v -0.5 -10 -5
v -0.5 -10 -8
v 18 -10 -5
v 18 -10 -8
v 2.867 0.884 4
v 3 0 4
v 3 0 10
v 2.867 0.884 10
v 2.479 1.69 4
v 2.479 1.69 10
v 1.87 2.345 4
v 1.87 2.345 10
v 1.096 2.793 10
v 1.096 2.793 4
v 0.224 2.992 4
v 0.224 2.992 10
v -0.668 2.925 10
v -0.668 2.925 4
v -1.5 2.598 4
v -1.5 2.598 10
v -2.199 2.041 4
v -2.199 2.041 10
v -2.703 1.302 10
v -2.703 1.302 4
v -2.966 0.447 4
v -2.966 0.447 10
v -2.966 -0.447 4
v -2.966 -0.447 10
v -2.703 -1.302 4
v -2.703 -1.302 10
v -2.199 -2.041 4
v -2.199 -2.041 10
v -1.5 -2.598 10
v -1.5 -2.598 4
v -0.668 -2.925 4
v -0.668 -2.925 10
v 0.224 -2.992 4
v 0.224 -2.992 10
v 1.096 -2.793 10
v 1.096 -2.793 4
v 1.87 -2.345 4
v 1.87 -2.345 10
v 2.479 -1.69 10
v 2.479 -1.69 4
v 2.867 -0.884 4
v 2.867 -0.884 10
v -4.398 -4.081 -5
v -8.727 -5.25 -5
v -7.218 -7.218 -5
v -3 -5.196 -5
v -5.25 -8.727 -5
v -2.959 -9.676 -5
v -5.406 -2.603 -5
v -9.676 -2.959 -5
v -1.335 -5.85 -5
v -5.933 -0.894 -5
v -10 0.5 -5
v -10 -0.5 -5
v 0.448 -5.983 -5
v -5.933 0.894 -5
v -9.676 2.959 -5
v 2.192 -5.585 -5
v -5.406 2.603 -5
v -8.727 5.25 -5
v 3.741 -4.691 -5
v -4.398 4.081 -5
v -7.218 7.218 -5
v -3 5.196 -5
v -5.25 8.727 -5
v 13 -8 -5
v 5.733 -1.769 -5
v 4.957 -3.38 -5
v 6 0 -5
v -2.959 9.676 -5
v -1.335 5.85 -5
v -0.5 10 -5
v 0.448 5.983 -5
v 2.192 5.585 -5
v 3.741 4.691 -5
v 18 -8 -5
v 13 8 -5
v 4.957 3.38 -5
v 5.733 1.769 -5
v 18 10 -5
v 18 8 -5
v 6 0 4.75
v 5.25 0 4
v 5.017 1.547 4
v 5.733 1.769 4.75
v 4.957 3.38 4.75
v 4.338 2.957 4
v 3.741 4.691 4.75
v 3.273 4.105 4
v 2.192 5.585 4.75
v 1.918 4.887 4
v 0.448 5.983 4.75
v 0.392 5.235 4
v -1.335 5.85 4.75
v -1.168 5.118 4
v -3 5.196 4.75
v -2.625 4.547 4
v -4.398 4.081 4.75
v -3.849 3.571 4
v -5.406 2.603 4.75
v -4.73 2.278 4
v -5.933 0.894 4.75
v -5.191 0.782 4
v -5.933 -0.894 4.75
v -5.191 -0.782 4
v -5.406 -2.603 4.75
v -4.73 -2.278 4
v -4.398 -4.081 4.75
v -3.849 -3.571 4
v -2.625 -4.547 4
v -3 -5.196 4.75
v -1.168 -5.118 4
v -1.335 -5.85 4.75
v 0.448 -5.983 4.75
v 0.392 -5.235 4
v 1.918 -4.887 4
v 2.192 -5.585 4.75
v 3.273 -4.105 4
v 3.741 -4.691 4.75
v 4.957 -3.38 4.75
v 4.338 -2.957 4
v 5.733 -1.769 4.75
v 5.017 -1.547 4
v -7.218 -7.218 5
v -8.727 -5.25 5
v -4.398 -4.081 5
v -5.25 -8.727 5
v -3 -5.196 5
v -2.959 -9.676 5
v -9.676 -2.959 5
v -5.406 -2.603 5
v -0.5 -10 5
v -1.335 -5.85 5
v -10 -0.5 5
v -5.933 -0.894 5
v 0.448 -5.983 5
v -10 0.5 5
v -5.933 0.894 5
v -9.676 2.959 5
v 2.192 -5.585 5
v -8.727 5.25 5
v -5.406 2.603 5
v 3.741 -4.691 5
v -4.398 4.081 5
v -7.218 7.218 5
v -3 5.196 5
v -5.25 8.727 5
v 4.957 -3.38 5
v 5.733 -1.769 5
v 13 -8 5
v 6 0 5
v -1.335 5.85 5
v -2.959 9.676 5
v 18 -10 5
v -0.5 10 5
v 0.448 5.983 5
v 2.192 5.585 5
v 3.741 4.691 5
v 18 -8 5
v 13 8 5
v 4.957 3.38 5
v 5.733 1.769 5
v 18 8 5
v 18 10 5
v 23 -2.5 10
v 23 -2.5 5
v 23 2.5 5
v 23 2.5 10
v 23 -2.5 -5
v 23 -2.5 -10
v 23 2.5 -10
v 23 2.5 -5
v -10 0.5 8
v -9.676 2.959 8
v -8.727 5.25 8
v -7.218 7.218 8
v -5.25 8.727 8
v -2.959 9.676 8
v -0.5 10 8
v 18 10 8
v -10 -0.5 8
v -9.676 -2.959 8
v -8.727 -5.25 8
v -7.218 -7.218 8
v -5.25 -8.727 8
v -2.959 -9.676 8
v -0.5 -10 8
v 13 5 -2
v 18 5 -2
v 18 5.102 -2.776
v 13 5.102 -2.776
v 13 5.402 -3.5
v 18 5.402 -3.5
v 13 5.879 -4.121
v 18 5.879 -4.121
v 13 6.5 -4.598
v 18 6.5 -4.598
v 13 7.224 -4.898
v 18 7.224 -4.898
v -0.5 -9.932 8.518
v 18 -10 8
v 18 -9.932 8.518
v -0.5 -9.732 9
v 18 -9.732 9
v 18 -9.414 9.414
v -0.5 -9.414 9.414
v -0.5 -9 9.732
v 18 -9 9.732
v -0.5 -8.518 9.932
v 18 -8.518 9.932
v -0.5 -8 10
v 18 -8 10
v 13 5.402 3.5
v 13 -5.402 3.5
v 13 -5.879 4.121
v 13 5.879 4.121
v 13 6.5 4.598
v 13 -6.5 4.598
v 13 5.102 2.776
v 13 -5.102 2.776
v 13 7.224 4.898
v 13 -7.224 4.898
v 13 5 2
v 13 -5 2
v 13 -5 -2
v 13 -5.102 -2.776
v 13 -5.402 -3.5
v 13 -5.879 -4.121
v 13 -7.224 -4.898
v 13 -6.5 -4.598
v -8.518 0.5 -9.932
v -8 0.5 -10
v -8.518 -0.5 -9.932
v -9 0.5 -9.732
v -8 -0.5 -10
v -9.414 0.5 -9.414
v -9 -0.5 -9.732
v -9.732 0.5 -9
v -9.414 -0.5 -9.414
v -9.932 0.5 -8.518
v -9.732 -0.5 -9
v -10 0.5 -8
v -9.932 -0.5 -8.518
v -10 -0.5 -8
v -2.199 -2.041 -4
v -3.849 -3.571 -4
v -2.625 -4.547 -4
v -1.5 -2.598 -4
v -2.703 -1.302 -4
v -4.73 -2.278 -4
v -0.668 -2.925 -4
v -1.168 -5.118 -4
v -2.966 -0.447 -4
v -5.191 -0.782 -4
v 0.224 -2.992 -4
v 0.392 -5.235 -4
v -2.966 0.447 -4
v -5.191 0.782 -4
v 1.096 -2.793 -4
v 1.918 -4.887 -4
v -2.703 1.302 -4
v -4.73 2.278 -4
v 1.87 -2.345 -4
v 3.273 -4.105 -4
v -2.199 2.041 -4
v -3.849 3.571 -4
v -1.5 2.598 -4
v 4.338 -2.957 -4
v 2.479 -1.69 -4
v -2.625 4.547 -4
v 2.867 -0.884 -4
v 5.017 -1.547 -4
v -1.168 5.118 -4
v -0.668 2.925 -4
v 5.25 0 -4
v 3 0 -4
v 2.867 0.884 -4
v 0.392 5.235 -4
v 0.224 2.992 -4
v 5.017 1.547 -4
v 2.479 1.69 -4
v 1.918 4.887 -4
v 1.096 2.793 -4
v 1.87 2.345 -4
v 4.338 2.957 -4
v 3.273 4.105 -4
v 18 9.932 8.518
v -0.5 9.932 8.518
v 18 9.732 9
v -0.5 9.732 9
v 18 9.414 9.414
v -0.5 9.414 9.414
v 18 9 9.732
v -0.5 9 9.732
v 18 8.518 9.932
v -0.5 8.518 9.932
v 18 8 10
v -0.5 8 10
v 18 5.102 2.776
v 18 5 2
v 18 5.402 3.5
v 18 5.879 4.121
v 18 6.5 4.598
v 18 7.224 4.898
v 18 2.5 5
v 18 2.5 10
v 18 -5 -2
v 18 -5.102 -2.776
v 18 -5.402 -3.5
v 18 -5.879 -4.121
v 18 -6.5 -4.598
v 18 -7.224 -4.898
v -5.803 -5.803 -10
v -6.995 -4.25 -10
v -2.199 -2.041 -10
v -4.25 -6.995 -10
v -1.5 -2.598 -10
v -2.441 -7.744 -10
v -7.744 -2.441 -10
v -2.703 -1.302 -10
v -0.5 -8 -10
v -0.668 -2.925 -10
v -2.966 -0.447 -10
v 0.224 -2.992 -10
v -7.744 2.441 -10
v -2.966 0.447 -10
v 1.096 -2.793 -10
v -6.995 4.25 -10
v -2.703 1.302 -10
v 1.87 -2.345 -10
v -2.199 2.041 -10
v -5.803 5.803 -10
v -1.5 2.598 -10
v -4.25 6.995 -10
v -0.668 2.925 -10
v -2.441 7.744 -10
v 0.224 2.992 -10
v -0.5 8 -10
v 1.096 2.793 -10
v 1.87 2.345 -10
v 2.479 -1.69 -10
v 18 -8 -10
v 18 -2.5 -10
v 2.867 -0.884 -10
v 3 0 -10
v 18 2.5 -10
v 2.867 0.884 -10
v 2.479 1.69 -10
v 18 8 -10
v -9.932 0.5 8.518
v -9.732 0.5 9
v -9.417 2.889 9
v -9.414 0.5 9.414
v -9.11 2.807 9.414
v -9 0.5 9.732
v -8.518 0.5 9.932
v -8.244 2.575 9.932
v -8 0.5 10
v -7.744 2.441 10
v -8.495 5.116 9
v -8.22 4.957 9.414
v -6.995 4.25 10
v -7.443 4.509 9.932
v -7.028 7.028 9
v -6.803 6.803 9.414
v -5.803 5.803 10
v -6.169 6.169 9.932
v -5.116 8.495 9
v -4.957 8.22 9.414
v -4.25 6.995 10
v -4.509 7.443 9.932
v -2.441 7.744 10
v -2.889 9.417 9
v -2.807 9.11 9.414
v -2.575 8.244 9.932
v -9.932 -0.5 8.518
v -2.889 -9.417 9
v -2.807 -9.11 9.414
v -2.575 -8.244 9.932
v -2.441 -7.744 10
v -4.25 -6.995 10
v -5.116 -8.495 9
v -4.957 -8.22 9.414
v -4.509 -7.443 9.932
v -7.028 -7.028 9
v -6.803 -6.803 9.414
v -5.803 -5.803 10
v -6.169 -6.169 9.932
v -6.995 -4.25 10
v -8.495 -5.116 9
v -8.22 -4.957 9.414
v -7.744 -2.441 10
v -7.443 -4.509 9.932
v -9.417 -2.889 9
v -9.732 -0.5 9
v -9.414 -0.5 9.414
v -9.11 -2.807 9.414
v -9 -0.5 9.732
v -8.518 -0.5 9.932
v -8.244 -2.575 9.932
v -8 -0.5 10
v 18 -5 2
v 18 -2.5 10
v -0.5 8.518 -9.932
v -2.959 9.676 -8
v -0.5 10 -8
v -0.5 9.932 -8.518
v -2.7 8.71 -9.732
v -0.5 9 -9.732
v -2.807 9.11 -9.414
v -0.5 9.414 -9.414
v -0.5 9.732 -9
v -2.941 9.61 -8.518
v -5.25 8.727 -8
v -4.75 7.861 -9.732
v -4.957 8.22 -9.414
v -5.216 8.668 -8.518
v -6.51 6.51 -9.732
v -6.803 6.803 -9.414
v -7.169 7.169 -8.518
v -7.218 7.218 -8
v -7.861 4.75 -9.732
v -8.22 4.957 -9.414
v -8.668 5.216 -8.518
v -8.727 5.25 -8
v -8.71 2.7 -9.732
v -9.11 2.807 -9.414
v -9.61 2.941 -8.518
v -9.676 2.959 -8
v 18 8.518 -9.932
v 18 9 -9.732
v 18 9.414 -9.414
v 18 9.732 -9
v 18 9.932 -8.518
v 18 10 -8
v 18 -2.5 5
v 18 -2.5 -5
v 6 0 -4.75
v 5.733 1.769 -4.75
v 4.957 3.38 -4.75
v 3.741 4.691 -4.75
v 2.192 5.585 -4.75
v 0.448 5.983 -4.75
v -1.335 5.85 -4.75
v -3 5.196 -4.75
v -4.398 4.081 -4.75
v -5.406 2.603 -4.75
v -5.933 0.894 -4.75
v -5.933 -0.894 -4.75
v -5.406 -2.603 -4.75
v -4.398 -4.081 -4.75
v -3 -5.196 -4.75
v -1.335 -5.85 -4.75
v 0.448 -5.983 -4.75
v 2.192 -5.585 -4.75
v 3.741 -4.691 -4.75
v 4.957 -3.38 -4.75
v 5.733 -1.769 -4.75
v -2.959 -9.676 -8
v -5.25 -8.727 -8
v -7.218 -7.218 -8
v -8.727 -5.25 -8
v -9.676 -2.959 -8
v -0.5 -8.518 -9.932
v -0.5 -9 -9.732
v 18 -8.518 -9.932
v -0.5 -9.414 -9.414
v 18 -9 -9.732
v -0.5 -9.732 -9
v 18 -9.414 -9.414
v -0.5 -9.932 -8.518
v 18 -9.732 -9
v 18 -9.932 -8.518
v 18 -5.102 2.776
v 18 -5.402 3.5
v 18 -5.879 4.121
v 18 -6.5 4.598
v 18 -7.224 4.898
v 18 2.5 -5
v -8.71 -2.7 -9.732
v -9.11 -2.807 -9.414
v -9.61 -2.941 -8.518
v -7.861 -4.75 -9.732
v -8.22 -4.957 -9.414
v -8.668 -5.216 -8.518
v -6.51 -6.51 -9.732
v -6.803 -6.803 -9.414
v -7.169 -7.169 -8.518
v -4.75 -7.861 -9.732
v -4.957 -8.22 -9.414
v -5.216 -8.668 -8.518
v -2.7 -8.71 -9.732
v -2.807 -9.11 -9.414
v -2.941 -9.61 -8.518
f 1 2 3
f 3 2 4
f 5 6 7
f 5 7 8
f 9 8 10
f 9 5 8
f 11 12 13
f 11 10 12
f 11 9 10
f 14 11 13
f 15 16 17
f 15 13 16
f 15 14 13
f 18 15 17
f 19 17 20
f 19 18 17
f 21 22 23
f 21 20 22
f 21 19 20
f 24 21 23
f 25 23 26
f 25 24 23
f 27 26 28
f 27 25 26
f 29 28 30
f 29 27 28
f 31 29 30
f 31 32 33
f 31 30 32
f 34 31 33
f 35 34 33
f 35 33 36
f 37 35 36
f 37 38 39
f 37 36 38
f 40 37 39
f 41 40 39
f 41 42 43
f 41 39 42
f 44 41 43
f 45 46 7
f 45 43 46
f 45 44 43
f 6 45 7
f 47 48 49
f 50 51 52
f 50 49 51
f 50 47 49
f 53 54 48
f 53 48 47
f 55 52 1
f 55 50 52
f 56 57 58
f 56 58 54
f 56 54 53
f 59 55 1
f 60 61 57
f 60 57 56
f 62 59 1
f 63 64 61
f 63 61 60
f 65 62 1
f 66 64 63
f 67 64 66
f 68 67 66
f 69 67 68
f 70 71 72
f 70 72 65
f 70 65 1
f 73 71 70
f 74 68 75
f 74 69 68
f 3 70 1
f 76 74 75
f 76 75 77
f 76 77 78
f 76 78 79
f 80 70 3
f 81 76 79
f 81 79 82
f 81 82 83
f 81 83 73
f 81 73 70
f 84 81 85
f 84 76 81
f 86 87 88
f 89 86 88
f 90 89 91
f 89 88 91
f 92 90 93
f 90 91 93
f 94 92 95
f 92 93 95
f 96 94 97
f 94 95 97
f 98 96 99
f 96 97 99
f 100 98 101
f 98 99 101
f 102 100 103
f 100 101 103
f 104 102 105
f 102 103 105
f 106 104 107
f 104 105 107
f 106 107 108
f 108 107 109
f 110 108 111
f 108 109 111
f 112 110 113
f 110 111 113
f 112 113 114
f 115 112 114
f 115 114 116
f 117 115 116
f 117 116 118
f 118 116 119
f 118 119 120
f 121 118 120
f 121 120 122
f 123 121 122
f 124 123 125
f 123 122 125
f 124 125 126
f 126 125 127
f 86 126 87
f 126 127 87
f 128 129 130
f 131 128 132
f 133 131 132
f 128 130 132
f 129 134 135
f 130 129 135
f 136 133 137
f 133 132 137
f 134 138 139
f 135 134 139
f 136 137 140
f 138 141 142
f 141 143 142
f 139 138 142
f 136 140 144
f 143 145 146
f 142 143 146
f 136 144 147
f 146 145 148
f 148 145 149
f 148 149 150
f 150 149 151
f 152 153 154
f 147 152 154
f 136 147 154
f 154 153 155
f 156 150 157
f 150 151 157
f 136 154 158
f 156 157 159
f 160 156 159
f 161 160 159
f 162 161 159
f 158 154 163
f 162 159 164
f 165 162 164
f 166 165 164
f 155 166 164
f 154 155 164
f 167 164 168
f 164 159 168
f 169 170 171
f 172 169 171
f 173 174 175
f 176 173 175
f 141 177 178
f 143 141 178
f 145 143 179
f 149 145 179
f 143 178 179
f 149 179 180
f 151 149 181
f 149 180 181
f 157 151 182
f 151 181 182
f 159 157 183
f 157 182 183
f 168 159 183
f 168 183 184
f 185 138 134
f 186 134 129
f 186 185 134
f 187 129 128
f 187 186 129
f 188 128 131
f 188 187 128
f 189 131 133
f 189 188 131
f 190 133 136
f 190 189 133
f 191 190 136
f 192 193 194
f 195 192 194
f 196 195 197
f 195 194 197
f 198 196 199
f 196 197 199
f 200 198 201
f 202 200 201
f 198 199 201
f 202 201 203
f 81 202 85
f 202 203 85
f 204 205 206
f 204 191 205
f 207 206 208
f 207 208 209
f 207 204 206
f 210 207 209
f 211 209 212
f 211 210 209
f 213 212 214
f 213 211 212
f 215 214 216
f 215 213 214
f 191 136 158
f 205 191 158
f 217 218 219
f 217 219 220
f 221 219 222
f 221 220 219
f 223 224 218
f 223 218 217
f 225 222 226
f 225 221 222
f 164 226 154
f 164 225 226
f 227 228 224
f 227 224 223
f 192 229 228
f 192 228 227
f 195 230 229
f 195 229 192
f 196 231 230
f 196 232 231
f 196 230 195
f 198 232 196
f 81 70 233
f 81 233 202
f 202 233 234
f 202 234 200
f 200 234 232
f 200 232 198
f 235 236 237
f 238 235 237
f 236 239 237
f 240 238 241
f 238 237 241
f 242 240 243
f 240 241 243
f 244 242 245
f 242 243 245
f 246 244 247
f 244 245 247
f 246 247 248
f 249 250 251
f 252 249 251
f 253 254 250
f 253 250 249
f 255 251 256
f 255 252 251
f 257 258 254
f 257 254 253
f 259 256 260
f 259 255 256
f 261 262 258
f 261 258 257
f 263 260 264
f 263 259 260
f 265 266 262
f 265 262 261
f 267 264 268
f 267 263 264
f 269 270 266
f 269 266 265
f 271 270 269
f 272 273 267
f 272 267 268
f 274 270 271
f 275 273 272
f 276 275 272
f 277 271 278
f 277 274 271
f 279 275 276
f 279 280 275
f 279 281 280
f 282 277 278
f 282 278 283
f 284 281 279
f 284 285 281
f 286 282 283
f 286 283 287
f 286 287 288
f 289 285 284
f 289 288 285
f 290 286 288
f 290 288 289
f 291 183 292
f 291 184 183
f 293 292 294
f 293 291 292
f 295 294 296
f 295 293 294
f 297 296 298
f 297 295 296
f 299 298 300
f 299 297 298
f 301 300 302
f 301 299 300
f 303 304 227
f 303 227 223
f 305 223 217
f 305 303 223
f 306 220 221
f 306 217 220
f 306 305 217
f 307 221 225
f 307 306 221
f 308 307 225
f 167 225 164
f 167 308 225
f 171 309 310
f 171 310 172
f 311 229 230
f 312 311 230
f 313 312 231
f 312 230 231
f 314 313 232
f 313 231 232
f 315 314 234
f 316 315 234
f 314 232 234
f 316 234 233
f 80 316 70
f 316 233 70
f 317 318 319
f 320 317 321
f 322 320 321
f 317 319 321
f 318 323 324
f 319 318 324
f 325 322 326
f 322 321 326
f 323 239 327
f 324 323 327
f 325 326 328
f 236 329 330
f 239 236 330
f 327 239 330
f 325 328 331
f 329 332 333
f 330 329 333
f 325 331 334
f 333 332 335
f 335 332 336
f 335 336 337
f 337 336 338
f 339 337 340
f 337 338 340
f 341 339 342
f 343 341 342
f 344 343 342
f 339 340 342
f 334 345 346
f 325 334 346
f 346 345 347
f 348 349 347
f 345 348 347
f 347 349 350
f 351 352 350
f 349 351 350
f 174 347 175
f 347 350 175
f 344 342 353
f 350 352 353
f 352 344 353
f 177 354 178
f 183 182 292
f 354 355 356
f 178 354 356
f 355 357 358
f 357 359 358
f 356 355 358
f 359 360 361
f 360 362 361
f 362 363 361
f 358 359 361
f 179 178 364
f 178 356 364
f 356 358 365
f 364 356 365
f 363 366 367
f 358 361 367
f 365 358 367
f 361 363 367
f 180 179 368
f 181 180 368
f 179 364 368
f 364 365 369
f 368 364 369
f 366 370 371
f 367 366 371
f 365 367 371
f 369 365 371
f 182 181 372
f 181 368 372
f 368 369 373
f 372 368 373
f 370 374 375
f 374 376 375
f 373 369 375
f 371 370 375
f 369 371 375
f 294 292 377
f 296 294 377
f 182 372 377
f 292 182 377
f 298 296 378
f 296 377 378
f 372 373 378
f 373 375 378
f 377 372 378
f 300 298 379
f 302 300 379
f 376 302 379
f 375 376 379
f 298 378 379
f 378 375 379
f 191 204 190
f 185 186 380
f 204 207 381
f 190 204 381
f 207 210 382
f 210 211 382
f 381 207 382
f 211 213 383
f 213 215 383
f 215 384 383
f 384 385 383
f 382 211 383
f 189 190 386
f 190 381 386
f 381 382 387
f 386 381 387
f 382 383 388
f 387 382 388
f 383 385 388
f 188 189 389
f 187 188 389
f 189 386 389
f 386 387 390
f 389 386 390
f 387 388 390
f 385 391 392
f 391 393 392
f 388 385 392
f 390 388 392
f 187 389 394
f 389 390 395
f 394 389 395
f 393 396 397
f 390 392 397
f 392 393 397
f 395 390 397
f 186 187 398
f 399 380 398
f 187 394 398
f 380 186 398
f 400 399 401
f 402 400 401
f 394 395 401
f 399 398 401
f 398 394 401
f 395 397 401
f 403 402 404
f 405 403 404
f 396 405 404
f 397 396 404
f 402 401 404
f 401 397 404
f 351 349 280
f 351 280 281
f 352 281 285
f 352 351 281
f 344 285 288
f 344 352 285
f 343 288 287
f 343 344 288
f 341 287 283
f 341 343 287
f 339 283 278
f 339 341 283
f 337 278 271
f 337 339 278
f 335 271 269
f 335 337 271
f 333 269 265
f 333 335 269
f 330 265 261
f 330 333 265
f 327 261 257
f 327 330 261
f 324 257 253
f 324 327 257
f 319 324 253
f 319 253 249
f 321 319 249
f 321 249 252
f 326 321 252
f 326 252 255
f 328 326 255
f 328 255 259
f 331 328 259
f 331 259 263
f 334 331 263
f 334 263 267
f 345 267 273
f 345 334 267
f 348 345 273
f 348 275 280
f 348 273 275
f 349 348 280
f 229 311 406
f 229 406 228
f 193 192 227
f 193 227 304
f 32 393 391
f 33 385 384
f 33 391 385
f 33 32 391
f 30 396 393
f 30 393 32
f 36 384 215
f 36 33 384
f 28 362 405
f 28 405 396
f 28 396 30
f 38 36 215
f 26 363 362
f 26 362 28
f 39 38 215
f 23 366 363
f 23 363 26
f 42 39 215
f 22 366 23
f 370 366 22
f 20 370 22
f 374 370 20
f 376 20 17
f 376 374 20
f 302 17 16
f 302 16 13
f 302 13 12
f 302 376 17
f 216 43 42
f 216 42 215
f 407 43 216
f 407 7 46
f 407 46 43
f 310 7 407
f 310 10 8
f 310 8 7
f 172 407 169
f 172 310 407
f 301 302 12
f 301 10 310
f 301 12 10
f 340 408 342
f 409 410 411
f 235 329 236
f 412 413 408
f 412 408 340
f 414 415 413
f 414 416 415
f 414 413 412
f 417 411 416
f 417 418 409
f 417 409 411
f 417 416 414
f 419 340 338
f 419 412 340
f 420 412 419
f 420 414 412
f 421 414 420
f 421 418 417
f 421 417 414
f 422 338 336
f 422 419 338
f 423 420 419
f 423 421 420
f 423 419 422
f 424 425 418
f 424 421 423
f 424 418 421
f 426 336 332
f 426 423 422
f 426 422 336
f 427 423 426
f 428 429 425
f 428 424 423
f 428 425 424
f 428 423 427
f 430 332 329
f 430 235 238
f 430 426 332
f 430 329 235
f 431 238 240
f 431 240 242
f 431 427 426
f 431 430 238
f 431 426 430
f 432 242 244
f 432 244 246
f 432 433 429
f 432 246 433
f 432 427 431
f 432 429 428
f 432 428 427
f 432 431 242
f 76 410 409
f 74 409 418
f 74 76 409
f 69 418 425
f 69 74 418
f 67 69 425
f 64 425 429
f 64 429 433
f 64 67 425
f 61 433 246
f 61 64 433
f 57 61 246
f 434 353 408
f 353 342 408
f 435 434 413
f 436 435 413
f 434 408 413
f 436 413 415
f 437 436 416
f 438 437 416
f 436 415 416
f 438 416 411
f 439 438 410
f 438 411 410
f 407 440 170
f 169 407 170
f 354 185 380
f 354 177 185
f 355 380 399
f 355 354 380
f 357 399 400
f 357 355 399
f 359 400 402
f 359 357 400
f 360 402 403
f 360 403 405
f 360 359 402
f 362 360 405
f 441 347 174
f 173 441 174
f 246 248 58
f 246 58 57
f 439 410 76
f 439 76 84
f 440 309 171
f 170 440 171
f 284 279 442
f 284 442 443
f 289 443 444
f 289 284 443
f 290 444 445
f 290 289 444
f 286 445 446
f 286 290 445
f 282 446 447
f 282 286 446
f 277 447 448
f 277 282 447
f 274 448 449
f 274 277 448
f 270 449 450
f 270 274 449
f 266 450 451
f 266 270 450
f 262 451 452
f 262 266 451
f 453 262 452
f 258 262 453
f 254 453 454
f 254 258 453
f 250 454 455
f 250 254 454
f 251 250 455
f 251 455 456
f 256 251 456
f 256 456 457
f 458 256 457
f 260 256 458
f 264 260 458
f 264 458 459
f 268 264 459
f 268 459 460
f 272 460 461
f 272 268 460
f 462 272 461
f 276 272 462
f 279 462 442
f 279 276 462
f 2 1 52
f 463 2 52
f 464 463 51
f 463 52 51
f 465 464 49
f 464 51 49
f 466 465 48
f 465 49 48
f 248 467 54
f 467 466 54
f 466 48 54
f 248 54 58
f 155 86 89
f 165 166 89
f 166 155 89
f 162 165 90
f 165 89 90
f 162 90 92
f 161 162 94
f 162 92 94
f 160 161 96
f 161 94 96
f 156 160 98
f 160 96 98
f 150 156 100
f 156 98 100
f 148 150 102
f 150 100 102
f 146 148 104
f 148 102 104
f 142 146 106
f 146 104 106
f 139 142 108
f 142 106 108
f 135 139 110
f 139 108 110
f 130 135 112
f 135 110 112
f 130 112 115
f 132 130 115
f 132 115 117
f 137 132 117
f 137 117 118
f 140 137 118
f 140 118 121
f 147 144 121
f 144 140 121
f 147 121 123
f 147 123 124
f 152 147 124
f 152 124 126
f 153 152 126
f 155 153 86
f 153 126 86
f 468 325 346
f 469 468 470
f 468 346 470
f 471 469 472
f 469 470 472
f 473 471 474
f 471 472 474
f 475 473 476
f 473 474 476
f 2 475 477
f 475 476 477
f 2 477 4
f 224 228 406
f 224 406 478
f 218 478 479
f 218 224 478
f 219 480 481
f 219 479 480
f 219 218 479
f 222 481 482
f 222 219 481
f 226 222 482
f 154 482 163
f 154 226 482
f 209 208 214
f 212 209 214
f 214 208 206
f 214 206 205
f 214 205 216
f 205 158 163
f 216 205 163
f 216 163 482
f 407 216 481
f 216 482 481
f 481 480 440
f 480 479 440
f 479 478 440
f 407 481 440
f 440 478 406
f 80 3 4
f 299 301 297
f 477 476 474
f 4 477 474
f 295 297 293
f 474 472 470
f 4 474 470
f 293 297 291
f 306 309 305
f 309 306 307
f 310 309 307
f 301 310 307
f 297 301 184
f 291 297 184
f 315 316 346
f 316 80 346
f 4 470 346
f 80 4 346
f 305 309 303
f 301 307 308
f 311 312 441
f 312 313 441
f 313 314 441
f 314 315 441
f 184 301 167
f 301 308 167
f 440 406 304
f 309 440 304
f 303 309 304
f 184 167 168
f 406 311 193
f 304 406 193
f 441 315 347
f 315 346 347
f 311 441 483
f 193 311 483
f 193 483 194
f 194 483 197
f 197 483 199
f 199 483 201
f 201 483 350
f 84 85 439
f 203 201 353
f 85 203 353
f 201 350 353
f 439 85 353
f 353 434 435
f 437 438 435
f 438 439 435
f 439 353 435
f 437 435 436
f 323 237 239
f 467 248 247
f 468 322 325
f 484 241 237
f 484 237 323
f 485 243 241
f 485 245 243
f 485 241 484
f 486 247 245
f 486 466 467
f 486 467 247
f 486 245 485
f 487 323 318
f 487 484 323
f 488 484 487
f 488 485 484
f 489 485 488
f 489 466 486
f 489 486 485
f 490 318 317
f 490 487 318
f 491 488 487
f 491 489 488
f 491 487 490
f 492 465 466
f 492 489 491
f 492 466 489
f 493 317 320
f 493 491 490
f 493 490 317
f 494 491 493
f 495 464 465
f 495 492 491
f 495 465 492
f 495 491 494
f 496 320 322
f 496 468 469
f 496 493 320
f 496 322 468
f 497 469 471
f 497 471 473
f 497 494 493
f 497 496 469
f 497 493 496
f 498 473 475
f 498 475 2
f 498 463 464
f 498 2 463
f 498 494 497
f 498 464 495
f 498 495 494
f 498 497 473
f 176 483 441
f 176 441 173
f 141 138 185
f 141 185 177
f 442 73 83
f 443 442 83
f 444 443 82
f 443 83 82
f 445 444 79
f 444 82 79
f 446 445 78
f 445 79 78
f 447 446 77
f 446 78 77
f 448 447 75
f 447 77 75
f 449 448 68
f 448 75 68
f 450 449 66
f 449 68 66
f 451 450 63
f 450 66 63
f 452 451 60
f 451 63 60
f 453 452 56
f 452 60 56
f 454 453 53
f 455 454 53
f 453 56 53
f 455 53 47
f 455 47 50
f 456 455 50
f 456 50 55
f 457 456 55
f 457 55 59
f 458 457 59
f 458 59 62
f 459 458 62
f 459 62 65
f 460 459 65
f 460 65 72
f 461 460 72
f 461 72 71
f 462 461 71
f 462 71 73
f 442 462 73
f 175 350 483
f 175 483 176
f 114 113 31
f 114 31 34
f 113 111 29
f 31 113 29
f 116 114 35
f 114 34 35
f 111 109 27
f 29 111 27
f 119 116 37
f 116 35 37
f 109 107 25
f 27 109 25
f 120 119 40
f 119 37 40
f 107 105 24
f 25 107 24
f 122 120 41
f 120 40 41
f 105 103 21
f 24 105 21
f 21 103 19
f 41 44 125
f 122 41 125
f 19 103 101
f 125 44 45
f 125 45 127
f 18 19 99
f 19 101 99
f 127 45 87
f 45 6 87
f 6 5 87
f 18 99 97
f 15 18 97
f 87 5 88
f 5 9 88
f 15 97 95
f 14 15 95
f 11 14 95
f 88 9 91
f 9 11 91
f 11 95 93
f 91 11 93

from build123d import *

# Parameters (mm, degrees)
BOX007_W          = 11
BOX007_H          = 7
BOX007_DEPTH      = 10
FILLET_R          = 3
ARRAY_COUNT       = 2
ARRAY_ANGLE       = 180
CYLINDER004_R     = 3
CYLINDER004_DEPTH = 30
CYLINDER005_R     = 6
CYLINDER005_DEPTH = 4
BOX005_W          = 23
BOX005_H          = 20
BOX005_DEPTH      = 5
BOX003_W          = 10
BOX003_H          = 5
BOX003_DEPTH      = 5
BOX004_W          = 10
BOX004_H          = 5
BOX004_DEPTH      = 5
BOX_W             = 5
BOX_H             = 20
BOX_DEPTH         = 20
BOX006_W          = 23
BOX006_H          = 20
BOX006_DEPTH      = 5
CYLINDER006_R     = 6
CYLINDER006_DEPTH = 4
CHAMFER_SIZE      = 0.75
CHAMFER001_SIZE   = 0.75
FILLET001_R       = 9.5
FILLET002_R       = 2


with BuildPart() as array:
    # Box007 → Box007 (new body)
    with BuildSketch(Plane(origin=(10, 5, -5), x_dir=(1, 0, 0), z_dir=(0, 0, 1))):
        with Locations((5.5, 3.5)):
            Rectangle(BOX007_W, BOX007_H)
    extrude(amount=BOX007_DEPTH)


with BuildPart() as array_1:
    # BaseFeature placement: moved
    add(array.part.moved(Location((-10, -5, 5))))

    # Fillet
    fillet_edges = [array_1.edges().sort_by_distance(p)[0] for p in [
        (5.5, 0, 10),
        (5.5, 0, 0),
    ]]
    fillet(fillet_edges, radius=FILLET_R)


with BuildPart() as array_2:
    # Body placement: moved
    add(array_1.part.moved(Location((-5, 5, 0))))

    # Array: Array ×2 about axis
    array_axis = Axis((0, 0, 0), (0, 0, 1))


with BuildPart() as array_3:
    add(array_2.part)
    for i in range(1, ARRAY_COUNT):
        add(array_2.part.rotate(array_axis, i * ARRAY_ANGLE / (ARRAY_COUNT - 1)))


with BuildPart() as array_4:
    # Array placement: moved
    add(array_3.part.moved(Location((14, 0, -5))))


with BuildPart() as cilindro004:
    # Cylinder004 → Cylinder004 (new body)
    with BuildSketch(Plane.XY.offset(-15)):
        Circle(CYLINDER004_R)
    extrude(amount=CYLINDER004_DEPTH)


with BuildPart() as apoyo2:
    # Cylinder005 → Cylinder005 (new body)
    with BuildSketch(Plane.XY.offset(-8)):
        Circle(CYLINDER005_R)
    extrude(amount=CYLINDER005_DEPTH)


with BuildPart() as cubo:
    # Box005 → Box005 (new body)
    with BuildSketch(Plane(origin=(-10, -10, -10), x_dir=(1, 0, 0), z_dir=(0, 0, 1))):
        with Locations((11.5, 10)):
            Rectangle(BOX005_W, BOX005_H)
    extrude(amount=BOX005_DEPTH)


with BuildPart() as cubo002:
    # Box003 → Box003 (new body)
    with BuildSketch(Plane(origin=(13, -2.5, 5), x_dir=(1, 0, 0), z_dir=(0, 0, 1))):
        with Locations((5, 2.5)):
            Rectangle(BOX003_W, BOX003_H)
    extrude(amount=BOX003_DEPTH)


with BuildPart() as cubo003:
    # Box004 → Box004 (new body)
    with BuildSketch(Plane(origin=(13, -2.5, -10), x_dir=(1, 0, 0), z_dir=(0, 0, 1))):
        with Locations((5, 2.5)):
            Rectangle(BOX004_W, BOX004_H)
    extrude(amount=BOX004_DEPTH)


with BuildPart() as fusion002001:
    # Box → Box (new body)
    with BuildSketch(Plane(origin=(13, -10, -10), x_dir=(1, 0, 0), z_dir=(0, 0, 1))):
        with Locations((2.5, 10)):
            Rectangle(BOX_W, BOX_H)
    extrude(amount=BOX_DEPTH)

    # Fusion002: union Cubo002, Cubo003
    add(cubo002.part)
    add(cubo003.part)


with BuildPart() as fusion002002001:
    # Box006 → Box006 (new body)
    with BuildSketch(Plane(origin=(-10, -10, 5), x_dir=(1, 0, 0), z_dir=(0, 0, 1))):
        with Locations((11.5, 10)):
            Rectangle(BOX006_W, BOX006_H)
    extrude(amount=BOX006_DEPTH)

    # Fusion002002: union Cubo, Fusion002001
    add(cubo.part)
    add(fusion002001.part)


with BuildPart() as body001:
    # Cylinder006 → Cylinder006 (new body)
    with BuildSketch(Plane.XY.offset(4)):
        Circle(CYLINDER006_R)
    extrude(amount=CYLINDER006_DEPTH)

    # Fusion002002002: union apoyo2, Fusion002002001
    add(apoyo2.part)
    add(fusion002002001.part)

    # Cut001: cut Cilindro004
    add(cilindro004.part, mode=Mode.SUBTRACT)

    # Cut002: cut Array
    add(array_4.part, mode=Mode.SUBTRACT)

    # Chamfer
    chamfer_edges = [body001.edges().sort_by_distance(p)[0] for p in [
        (-6, 0, -4),
    ]]
    chamfer(chamfer_edges, length=CHAMFER_SIZE)

    # Chamfer001
    chamfer001_edges = [body001.edges().sort_by_distance(p)[0] for p in [
        (-6, 0, 4),
    ]]
    chamfer(chamfer001_edges, length=CHAMFER001_SIZE)

    # Fillet001
    fillet001_edges = [body001.edges().sort_by_distance(p)[0] for p in [
        (-10, 10, 7.5),
        (-10, -10, 7.5),
        (-10, -10, -7.5),
        (-10, 10, -7.5),
    ]]
    fillet(fillet001_edges, radius=FILLET001_R)

    # Fillet002
    fillet002_edges = [body001.edges().sort_by_distance(p)[0] for p in [
        (8.75, 10, 10),
        (8.75, 10, -10),
    ]]
    fillet(fillet002_edges, radius=FILLET002_R)


solid = body001.part
